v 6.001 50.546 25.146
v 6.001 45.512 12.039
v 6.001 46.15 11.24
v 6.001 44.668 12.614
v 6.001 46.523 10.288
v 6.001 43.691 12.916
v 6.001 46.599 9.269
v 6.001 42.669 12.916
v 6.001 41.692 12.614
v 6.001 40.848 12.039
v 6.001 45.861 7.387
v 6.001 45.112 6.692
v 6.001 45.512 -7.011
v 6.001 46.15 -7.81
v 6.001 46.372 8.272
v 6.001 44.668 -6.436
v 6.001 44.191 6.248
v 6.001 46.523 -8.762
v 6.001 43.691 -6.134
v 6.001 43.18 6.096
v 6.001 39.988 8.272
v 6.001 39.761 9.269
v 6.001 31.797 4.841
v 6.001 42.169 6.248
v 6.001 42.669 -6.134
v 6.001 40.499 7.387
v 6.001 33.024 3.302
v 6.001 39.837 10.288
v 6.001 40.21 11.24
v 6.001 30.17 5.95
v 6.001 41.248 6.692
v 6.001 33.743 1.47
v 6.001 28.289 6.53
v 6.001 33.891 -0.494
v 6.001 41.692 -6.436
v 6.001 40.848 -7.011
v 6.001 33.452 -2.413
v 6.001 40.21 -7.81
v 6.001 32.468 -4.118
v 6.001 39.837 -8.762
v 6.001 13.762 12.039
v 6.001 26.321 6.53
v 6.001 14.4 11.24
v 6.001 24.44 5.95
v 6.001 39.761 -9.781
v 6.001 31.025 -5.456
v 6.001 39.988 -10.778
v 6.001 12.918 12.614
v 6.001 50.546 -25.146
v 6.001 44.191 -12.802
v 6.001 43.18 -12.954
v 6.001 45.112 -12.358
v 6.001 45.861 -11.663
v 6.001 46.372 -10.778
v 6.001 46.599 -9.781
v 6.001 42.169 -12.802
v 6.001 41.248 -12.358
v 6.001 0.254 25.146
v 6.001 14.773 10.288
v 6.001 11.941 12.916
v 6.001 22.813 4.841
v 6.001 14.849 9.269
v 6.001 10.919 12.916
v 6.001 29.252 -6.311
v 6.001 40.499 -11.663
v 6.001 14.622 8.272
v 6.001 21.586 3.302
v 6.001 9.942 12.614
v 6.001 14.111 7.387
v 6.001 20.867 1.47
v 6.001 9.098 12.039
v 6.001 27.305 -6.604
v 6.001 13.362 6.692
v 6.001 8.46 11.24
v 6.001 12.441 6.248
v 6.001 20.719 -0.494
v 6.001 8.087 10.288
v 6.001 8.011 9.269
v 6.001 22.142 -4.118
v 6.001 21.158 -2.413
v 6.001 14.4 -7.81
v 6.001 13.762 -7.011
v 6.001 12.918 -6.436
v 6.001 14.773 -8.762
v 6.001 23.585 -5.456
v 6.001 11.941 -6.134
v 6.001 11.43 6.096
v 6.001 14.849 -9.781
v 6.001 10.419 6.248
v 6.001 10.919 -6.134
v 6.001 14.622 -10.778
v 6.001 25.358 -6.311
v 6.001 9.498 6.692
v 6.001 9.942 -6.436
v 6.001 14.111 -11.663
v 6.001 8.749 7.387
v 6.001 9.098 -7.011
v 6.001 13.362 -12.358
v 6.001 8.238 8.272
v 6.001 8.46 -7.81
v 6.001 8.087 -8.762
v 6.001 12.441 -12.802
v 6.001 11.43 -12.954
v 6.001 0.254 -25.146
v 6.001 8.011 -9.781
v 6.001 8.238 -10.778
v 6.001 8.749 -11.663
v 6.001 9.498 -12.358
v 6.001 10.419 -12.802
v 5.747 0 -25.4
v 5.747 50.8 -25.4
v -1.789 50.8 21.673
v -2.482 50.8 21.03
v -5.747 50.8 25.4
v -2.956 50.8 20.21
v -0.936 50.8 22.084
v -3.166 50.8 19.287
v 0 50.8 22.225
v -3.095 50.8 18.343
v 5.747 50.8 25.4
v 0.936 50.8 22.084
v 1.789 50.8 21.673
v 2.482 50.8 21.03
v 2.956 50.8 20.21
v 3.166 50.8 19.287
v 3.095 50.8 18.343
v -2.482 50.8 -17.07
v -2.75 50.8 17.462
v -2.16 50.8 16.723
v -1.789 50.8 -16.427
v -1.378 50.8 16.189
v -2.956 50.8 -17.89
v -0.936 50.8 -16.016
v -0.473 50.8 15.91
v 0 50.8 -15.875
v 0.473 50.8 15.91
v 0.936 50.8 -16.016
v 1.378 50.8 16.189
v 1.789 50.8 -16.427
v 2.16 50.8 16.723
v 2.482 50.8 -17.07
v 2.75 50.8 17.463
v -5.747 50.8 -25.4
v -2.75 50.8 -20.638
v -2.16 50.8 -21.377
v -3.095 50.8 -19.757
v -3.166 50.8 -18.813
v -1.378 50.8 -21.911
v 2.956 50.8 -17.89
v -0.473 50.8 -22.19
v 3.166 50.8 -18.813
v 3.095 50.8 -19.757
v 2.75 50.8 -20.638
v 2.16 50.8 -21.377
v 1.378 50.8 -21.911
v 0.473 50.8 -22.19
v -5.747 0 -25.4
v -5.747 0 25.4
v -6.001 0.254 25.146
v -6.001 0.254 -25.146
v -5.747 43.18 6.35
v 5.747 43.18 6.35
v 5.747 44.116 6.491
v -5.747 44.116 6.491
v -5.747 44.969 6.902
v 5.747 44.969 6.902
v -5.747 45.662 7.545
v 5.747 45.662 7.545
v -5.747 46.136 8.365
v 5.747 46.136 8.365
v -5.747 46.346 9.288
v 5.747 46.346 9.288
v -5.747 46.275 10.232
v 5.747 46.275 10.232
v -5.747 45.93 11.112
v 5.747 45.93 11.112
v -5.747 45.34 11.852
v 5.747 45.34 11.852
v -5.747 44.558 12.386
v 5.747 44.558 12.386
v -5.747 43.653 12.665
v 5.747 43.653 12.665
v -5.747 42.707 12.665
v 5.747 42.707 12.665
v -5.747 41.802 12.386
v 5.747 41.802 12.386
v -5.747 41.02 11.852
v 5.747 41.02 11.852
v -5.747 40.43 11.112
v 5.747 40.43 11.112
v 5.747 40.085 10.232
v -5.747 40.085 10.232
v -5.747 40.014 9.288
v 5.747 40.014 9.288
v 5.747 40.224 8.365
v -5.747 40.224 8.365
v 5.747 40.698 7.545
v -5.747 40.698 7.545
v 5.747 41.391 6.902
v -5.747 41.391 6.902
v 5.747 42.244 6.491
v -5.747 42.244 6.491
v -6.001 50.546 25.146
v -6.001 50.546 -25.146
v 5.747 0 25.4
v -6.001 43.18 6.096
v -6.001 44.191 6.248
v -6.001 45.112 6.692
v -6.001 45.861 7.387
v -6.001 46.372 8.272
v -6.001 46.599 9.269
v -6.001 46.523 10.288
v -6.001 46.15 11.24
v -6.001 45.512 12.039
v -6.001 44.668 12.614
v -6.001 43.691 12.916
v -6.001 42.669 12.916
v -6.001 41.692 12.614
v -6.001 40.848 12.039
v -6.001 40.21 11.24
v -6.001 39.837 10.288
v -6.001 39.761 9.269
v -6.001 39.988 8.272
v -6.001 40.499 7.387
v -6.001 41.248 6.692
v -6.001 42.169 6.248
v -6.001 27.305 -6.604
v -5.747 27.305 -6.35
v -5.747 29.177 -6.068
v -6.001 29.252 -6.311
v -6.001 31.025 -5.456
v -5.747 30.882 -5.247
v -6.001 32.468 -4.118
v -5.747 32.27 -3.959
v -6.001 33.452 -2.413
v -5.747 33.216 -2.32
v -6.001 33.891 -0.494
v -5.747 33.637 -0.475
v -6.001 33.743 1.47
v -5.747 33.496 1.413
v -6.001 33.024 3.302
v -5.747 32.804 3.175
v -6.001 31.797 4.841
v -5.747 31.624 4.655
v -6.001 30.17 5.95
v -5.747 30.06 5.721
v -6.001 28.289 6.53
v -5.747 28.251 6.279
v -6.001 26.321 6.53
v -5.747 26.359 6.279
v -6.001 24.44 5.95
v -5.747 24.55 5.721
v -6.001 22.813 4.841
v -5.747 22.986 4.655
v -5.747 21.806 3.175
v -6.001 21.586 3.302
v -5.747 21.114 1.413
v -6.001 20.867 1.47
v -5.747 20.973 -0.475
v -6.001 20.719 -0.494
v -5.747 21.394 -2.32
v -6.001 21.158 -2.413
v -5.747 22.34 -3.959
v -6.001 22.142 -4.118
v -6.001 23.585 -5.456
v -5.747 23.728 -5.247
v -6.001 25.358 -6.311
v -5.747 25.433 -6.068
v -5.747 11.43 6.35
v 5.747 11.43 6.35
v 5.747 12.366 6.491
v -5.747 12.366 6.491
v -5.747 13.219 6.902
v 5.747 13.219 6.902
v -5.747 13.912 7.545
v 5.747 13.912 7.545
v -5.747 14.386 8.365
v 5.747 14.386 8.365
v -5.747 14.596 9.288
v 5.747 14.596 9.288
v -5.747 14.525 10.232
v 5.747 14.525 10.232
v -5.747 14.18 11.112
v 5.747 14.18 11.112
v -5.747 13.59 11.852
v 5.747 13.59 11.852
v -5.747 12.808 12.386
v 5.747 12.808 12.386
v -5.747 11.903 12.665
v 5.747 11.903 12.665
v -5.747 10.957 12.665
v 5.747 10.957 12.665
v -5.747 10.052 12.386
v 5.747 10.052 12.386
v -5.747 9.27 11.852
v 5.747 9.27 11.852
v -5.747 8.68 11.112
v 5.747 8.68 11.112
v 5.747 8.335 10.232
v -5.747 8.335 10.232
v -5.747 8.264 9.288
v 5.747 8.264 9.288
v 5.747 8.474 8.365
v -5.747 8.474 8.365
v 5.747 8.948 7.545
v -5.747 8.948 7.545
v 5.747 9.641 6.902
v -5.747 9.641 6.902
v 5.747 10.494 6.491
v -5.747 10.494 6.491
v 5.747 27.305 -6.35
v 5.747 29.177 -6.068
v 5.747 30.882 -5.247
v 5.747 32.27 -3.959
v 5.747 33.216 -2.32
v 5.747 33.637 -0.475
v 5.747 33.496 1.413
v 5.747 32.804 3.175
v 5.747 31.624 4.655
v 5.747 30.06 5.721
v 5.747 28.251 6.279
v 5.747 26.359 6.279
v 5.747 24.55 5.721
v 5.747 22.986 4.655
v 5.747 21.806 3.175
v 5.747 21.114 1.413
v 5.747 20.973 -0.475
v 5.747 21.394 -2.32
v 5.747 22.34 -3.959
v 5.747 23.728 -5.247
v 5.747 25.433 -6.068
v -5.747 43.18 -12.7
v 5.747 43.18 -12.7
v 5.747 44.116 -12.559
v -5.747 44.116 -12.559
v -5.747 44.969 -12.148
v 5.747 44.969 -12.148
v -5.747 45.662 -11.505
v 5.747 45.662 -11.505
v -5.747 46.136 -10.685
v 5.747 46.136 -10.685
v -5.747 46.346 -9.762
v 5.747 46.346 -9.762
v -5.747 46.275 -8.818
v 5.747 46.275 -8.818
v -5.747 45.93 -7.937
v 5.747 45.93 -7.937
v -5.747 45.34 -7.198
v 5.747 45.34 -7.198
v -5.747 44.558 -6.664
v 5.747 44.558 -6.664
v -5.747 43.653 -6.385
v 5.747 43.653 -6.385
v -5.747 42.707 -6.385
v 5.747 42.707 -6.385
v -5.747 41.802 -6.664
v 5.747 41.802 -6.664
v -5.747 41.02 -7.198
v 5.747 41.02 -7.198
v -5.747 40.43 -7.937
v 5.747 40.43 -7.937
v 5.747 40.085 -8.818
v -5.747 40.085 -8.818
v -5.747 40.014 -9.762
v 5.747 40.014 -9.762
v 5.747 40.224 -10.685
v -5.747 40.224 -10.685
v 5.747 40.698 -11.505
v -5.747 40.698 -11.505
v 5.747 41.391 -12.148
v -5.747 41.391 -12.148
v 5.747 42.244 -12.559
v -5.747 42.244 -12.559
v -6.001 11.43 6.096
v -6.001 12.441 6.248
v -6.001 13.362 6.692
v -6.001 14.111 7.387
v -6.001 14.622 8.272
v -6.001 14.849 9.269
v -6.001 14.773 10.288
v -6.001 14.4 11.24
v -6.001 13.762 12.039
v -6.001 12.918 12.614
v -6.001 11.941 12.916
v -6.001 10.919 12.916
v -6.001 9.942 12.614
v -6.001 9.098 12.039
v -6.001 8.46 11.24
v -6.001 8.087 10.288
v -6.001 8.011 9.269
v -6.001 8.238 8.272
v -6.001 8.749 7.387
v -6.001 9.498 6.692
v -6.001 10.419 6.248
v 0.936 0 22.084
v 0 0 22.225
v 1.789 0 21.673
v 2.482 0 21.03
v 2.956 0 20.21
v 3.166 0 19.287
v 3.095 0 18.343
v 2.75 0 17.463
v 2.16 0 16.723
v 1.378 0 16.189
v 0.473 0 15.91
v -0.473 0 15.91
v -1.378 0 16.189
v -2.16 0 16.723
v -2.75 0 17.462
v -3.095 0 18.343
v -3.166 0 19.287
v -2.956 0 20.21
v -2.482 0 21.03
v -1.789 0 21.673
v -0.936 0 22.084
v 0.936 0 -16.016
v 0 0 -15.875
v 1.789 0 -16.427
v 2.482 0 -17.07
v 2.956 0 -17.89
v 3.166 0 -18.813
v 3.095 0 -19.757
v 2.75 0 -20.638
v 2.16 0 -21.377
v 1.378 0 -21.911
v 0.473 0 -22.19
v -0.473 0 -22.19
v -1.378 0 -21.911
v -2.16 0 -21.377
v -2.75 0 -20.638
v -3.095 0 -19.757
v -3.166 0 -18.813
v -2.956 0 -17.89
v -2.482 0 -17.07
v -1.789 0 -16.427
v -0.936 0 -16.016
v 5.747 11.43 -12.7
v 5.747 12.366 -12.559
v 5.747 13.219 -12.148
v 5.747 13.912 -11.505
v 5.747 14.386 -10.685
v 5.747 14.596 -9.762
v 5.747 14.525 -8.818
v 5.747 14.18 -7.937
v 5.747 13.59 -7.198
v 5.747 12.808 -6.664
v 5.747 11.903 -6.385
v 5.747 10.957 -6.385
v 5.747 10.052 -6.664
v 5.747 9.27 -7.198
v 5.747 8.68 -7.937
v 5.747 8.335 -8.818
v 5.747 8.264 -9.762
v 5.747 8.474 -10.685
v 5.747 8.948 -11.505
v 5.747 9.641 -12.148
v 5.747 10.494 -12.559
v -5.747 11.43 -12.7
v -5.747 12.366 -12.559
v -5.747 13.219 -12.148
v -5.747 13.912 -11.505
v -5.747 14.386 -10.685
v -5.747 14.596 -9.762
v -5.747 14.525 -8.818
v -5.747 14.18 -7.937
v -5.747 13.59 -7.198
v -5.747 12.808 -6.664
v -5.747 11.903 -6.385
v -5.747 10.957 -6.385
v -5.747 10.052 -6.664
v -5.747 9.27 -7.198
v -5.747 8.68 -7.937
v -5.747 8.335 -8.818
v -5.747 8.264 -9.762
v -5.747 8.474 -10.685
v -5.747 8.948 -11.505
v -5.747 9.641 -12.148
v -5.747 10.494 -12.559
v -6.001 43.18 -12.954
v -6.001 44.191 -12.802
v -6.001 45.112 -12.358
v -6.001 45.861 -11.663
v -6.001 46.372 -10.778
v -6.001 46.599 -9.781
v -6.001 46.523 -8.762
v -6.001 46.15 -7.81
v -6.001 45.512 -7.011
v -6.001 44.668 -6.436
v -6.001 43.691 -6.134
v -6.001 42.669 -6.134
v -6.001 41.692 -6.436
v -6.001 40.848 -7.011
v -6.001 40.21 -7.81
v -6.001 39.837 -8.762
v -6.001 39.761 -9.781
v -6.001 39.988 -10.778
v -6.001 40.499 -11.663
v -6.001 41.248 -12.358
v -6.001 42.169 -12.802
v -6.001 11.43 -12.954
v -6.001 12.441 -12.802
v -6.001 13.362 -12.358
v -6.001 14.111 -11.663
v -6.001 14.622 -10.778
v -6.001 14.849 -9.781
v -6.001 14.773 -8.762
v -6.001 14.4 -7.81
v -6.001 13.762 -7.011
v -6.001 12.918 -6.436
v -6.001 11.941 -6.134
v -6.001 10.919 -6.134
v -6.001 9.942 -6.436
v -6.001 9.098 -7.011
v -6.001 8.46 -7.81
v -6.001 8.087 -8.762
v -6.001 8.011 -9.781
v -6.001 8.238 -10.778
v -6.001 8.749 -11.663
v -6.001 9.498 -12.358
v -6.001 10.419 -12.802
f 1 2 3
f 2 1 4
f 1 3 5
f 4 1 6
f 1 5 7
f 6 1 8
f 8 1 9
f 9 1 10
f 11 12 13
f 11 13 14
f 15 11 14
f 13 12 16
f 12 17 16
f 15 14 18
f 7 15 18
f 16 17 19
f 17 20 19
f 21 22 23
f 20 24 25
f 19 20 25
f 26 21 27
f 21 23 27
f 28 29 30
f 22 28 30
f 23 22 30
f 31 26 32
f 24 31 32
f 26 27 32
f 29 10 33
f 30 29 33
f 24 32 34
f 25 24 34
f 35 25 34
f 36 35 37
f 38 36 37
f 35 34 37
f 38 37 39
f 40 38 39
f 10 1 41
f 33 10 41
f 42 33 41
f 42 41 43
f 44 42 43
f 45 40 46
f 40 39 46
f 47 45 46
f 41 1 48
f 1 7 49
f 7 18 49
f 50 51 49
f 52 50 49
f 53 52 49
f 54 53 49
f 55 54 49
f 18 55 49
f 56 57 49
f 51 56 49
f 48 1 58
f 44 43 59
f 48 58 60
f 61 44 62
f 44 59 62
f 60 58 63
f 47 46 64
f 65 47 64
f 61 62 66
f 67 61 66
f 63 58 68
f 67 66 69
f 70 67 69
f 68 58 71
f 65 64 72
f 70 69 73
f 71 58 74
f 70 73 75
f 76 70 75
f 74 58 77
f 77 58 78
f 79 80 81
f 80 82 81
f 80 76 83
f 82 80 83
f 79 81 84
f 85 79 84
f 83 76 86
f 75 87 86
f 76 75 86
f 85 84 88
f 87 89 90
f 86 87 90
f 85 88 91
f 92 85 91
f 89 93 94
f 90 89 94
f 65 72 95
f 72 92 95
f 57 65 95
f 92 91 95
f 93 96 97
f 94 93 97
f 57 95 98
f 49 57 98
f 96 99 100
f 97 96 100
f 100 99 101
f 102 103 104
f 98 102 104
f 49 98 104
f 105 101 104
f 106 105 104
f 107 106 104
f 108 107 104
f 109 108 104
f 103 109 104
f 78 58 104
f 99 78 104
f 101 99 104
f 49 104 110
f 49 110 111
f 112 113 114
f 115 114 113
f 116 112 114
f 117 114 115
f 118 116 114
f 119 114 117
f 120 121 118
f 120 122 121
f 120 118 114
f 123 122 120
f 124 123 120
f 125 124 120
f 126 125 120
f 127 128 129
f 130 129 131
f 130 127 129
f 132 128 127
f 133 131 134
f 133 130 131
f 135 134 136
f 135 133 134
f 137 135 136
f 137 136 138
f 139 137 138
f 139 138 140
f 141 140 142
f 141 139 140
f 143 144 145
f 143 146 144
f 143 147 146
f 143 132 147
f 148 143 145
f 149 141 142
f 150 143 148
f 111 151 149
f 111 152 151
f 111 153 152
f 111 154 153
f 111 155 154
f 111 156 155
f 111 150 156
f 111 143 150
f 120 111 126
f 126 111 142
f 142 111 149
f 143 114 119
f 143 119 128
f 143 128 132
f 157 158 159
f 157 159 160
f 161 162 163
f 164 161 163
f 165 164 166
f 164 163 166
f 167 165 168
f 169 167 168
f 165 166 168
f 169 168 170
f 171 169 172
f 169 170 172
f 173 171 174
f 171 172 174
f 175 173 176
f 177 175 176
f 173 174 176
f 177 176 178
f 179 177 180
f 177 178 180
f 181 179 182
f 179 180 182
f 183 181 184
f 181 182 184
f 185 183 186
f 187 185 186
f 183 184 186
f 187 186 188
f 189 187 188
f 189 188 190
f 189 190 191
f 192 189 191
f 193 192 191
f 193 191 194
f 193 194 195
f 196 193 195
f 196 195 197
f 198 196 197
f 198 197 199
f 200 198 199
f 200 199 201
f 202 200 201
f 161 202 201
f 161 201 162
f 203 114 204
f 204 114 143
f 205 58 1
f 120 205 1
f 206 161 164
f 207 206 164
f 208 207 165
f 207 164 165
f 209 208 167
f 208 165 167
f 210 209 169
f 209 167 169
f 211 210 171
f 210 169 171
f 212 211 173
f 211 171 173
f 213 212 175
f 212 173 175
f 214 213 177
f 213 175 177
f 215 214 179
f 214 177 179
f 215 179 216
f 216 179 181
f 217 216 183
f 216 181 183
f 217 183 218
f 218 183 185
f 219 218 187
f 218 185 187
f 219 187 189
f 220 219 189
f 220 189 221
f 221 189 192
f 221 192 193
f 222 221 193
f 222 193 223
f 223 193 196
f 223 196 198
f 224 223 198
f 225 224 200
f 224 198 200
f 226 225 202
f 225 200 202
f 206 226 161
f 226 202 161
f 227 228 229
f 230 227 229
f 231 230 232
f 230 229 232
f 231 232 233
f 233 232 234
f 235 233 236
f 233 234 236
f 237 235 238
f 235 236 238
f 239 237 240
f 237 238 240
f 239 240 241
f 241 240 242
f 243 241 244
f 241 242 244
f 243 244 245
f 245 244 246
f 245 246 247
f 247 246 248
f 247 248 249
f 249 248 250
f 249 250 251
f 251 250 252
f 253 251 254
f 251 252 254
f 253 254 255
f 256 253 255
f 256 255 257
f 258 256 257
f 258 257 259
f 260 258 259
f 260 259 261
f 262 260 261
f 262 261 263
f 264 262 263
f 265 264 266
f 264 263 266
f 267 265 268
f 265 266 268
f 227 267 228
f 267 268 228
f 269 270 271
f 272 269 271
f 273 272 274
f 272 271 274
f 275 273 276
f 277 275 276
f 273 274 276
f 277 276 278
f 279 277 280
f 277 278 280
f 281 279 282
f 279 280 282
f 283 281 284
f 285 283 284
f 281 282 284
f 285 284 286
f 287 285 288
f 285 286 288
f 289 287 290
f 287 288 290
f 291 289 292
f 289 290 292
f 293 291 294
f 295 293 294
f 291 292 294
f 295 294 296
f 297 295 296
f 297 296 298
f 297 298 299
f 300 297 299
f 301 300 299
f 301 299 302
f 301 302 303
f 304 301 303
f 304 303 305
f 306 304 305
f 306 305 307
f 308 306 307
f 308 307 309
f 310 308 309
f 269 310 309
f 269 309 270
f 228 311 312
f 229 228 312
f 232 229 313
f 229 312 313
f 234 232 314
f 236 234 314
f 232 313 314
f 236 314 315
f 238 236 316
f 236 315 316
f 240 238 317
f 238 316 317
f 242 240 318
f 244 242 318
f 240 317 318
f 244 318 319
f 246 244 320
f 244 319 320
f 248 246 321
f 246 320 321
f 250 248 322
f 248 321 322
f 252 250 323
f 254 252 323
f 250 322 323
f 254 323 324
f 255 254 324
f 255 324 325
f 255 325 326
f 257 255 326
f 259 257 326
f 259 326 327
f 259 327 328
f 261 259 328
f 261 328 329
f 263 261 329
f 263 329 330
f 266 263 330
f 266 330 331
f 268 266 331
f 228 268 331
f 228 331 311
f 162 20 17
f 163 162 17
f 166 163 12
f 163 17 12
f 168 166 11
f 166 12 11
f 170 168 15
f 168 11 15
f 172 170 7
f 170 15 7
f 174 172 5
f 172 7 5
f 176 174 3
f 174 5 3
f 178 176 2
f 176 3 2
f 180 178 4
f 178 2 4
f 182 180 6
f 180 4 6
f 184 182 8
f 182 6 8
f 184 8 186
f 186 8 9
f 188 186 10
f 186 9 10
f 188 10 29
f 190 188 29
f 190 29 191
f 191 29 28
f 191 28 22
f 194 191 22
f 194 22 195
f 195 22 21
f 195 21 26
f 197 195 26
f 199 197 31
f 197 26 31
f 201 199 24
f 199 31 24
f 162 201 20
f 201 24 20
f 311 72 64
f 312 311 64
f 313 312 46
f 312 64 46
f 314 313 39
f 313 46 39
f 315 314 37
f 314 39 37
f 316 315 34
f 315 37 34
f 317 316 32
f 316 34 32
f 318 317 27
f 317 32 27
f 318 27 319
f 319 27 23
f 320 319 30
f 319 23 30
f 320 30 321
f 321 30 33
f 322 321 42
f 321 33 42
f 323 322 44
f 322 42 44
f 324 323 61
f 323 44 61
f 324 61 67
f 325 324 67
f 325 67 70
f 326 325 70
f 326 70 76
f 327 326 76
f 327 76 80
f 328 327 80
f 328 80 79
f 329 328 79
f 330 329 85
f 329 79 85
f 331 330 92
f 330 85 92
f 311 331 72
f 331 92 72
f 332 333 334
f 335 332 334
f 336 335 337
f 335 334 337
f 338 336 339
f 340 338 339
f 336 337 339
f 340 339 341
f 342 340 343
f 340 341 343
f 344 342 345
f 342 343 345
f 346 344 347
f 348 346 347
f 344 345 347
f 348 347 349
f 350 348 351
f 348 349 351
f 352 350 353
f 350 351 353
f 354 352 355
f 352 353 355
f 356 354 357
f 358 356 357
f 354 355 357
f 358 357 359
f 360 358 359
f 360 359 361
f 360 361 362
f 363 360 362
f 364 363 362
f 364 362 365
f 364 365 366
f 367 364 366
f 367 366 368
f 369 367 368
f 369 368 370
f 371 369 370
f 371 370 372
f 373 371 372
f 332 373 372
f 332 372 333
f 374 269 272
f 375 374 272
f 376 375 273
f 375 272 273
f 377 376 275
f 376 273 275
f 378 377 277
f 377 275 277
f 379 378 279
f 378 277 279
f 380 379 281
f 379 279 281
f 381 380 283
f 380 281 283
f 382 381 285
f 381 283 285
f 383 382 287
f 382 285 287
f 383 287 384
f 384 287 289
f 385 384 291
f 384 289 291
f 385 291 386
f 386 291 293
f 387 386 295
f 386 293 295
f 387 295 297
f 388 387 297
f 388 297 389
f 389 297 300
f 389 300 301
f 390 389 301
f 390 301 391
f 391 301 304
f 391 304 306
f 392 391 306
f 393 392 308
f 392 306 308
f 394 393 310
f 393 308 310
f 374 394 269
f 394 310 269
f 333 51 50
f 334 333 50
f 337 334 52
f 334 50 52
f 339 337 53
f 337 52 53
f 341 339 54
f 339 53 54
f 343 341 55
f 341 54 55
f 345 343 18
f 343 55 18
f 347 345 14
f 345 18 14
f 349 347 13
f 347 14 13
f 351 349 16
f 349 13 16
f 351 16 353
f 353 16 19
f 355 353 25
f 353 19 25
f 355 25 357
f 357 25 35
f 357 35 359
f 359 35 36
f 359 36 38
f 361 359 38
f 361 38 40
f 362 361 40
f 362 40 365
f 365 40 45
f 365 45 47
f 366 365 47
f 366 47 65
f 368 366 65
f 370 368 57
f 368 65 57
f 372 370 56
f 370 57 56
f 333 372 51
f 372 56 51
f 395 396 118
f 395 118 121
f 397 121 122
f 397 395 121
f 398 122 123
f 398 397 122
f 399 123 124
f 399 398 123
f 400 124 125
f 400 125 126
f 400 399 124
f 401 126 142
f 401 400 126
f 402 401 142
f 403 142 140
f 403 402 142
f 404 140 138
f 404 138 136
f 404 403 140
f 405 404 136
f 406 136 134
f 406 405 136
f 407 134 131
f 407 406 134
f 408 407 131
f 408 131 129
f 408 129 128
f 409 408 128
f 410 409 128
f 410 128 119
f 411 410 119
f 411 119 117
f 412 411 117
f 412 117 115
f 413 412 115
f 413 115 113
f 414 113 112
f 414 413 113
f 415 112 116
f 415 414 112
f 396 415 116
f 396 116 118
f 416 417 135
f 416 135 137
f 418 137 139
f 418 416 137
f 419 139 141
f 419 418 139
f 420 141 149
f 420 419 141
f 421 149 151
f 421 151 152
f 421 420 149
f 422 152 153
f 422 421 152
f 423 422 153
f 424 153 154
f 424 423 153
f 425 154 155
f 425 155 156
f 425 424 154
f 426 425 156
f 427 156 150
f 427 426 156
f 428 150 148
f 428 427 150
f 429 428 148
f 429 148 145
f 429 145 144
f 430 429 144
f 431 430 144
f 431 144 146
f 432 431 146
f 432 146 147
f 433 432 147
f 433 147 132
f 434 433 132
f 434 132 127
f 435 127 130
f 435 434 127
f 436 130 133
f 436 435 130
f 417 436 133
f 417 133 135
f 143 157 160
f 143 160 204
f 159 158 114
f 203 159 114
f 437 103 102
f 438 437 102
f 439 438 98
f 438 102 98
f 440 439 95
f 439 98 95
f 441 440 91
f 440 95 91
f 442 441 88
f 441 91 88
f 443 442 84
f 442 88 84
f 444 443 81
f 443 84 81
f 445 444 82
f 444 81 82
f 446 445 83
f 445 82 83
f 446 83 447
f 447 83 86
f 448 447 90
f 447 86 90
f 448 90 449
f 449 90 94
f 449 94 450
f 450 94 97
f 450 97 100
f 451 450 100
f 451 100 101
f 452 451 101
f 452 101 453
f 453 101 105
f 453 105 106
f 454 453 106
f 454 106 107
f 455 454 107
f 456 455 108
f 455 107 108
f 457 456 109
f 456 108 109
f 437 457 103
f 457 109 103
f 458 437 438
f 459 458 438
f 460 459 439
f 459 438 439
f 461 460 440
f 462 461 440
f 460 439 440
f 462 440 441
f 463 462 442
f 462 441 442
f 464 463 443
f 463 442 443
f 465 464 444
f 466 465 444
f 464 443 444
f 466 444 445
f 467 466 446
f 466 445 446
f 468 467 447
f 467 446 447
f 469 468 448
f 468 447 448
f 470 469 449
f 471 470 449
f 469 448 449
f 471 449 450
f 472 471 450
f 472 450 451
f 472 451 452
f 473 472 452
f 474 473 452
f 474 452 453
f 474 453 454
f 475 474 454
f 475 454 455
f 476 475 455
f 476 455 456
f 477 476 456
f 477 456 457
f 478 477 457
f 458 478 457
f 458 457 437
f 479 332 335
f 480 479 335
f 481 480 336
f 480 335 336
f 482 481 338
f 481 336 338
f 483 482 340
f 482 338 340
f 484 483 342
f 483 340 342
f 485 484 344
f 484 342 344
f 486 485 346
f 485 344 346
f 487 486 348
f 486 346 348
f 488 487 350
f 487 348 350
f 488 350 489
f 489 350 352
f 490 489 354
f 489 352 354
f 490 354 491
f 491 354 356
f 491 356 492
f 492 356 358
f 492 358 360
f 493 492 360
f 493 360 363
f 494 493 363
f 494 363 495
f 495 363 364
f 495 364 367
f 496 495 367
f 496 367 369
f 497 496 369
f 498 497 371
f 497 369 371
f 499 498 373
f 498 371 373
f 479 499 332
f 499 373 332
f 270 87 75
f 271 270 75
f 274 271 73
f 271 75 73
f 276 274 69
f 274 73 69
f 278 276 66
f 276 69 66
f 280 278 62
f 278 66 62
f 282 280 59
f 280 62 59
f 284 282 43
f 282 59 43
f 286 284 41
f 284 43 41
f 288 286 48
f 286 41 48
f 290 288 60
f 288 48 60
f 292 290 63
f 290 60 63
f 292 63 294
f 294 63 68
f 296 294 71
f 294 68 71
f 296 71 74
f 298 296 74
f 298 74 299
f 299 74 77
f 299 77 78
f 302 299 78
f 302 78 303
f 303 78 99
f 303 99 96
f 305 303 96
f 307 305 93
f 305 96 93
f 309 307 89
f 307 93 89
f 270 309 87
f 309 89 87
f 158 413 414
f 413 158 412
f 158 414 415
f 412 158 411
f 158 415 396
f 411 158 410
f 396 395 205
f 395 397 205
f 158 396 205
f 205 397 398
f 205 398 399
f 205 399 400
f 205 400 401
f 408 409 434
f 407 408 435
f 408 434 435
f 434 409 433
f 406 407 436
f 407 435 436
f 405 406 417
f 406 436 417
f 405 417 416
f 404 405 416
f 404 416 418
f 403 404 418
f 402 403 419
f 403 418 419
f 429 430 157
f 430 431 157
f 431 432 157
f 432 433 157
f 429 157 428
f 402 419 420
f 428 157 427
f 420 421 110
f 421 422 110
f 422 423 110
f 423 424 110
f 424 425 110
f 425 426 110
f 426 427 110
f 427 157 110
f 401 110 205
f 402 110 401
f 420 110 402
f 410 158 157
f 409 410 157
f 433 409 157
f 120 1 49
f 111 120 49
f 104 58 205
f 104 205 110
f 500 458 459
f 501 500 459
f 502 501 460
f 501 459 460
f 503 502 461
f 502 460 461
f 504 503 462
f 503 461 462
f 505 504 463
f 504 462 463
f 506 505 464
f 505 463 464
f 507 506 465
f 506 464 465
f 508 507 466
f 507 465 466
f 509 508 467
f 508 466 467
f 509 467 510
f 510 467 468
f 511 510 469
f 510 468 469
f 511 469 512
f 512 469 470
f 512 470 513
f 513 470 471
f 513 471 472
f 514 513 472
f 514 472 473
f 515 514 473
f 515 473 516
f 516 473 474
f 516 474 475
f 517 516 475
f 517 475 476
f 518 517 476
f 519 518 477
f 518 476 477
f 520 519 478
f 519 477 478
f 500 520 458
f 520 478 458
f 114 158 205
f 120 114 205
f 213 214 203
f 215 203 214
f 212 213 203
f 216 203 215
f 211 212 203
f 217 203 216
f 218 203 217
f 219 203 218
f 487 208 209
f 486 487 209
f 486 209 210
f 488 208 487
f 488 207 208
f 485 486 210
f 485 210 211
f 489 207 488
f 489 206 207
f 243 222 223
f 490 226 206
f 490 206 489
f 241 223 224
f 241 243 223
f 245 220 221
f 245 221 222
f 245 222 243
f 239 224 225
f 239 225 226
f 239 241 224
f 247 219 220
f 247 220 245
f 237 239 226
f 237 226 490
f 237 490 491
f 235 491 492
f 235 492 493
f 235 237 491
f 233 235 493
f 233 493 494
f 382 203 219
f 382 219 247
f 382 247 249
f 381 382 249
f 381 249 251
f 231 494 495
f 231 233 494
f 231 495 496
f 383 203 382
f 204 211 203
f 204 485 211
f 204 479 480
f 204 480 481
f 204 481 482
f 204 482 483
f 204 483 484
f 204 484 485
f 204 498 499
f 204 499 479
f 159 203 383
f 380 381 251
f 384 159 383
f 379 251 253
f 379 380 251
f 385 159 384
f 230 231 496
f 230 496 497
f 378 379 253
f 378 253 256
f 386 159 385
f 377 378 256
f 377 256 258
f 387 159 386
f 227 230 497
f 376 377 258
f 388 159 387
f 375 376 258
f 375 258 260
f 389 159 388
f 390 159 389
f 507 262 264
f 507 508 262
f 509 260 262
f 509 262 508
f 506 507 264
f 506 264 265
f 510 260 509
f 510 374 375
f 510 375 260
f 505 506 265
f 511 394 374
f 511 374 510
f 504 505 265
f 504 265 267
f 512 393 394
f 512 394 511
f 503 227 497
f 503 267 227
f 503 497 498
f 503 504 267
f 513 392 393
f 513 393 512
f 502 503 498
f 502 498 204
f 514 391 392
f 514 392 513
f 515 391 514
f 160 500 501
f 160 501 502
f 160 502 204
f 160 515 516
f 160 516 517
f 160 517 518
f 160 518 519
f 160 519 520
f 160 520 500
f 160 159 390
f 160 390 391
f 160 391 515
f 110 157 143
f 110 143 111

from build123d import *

# Parameters (mm, degrees)
SKETCH1_W           = 12.001902846
SKETCH1_H           = 50.8
SKETCH1_R           = 3.175
BOSS_EXTRUDE1_DEPTH = 50.8
SKETCH2_R           = 3.175
SKETCH2_R_2         = 6.35
CUT_EXTRUDE1_DEPTH  = 50.8
CHAMFER1_SIZE       = 0.254


with BuildPart() as part:
    # Sketch1 → Boss-Extrude1 (new body)
    with BuildSketch(Plane(origin=(0, 0, 0), x_dir=(1, 0, 0), z_dir=(0, 1, 0))):
        Rectangle(SKETCH1_W, SKETCH1_H)
        with Locations(Location((0, 19.05, 0), (0, 0, 270))):
            Circle(SKETCH1_R, mode=Mode.SUBTRACT)
        with Locations(Location((0, -19.05, 0), (0, 0, 270))):
            Circle(SKETCH1_R, mode=Mode.SUBTRACT)
    extrude(amount=BOSS_EXTRUDE1_DEPTH)

    # Sketch2 → Cut-Extrude1 (cut)
    with BuildSketch(Plane(origin=(6.000951423, 0, 0), x_dir=(0, 0, -1), z_dir=(1, 0, 0))):
        with Locations((-9.525, 43.18)):
            Circle(SKETCH2_R)
        with Locations((9.525, 43.18)):
            Circle(SKETCH2_R)
        with Locations((0, 27.305)):
            Circle(SKETCH2_R_2)
        with Locations((-9.525, 11.43)):
            Circle(SKETCH2_R)
        with Locations((9.525, 11.43)):
            Circle(SKETCH2_R)
    extrude(amount=-CUT_EXTRUDE1_DEPTH, mode=Mode.SUBTRACT)

    # Chamfer1
    chamfer1_edges = [part.edges().sort_by_distance(p)[0] for p in [
        (6.000951423, 50.8, 0),
        (-6.000951423, 11.43, -6.35),
        (6.000951423, 11.43, -6.35),
        (-6.000951423, 11.43, 12.7),
        (6.000951423, 11.43, 12.7),
        (-6.000951423, 27.305, 6.35),
        (6.000951423, 27.305, 6.35),
        (-6.000951423, 43.18, -6.35),
        (6.000951423, 43.18, -6.35),
        (-6.000951423, 43.18, 12.7),
        (6.000951423, 43.18, 12.7),
        (-6.000951423, 50.8, 0),
        (6.000951423, 0, 0),
        (-6.000951423, 0, 0),
        (-6.000951423, 25.4, -25.4),
        (6.000951423, 25.4, -25.4),
        (6.000951423, 25.4, 25.4),
        (-6.000951423, 25.4, 25.4),
    ]]
    chamfer(chamfer1_edges, length=CHAMFER1_SIZE)


solid = part.part
